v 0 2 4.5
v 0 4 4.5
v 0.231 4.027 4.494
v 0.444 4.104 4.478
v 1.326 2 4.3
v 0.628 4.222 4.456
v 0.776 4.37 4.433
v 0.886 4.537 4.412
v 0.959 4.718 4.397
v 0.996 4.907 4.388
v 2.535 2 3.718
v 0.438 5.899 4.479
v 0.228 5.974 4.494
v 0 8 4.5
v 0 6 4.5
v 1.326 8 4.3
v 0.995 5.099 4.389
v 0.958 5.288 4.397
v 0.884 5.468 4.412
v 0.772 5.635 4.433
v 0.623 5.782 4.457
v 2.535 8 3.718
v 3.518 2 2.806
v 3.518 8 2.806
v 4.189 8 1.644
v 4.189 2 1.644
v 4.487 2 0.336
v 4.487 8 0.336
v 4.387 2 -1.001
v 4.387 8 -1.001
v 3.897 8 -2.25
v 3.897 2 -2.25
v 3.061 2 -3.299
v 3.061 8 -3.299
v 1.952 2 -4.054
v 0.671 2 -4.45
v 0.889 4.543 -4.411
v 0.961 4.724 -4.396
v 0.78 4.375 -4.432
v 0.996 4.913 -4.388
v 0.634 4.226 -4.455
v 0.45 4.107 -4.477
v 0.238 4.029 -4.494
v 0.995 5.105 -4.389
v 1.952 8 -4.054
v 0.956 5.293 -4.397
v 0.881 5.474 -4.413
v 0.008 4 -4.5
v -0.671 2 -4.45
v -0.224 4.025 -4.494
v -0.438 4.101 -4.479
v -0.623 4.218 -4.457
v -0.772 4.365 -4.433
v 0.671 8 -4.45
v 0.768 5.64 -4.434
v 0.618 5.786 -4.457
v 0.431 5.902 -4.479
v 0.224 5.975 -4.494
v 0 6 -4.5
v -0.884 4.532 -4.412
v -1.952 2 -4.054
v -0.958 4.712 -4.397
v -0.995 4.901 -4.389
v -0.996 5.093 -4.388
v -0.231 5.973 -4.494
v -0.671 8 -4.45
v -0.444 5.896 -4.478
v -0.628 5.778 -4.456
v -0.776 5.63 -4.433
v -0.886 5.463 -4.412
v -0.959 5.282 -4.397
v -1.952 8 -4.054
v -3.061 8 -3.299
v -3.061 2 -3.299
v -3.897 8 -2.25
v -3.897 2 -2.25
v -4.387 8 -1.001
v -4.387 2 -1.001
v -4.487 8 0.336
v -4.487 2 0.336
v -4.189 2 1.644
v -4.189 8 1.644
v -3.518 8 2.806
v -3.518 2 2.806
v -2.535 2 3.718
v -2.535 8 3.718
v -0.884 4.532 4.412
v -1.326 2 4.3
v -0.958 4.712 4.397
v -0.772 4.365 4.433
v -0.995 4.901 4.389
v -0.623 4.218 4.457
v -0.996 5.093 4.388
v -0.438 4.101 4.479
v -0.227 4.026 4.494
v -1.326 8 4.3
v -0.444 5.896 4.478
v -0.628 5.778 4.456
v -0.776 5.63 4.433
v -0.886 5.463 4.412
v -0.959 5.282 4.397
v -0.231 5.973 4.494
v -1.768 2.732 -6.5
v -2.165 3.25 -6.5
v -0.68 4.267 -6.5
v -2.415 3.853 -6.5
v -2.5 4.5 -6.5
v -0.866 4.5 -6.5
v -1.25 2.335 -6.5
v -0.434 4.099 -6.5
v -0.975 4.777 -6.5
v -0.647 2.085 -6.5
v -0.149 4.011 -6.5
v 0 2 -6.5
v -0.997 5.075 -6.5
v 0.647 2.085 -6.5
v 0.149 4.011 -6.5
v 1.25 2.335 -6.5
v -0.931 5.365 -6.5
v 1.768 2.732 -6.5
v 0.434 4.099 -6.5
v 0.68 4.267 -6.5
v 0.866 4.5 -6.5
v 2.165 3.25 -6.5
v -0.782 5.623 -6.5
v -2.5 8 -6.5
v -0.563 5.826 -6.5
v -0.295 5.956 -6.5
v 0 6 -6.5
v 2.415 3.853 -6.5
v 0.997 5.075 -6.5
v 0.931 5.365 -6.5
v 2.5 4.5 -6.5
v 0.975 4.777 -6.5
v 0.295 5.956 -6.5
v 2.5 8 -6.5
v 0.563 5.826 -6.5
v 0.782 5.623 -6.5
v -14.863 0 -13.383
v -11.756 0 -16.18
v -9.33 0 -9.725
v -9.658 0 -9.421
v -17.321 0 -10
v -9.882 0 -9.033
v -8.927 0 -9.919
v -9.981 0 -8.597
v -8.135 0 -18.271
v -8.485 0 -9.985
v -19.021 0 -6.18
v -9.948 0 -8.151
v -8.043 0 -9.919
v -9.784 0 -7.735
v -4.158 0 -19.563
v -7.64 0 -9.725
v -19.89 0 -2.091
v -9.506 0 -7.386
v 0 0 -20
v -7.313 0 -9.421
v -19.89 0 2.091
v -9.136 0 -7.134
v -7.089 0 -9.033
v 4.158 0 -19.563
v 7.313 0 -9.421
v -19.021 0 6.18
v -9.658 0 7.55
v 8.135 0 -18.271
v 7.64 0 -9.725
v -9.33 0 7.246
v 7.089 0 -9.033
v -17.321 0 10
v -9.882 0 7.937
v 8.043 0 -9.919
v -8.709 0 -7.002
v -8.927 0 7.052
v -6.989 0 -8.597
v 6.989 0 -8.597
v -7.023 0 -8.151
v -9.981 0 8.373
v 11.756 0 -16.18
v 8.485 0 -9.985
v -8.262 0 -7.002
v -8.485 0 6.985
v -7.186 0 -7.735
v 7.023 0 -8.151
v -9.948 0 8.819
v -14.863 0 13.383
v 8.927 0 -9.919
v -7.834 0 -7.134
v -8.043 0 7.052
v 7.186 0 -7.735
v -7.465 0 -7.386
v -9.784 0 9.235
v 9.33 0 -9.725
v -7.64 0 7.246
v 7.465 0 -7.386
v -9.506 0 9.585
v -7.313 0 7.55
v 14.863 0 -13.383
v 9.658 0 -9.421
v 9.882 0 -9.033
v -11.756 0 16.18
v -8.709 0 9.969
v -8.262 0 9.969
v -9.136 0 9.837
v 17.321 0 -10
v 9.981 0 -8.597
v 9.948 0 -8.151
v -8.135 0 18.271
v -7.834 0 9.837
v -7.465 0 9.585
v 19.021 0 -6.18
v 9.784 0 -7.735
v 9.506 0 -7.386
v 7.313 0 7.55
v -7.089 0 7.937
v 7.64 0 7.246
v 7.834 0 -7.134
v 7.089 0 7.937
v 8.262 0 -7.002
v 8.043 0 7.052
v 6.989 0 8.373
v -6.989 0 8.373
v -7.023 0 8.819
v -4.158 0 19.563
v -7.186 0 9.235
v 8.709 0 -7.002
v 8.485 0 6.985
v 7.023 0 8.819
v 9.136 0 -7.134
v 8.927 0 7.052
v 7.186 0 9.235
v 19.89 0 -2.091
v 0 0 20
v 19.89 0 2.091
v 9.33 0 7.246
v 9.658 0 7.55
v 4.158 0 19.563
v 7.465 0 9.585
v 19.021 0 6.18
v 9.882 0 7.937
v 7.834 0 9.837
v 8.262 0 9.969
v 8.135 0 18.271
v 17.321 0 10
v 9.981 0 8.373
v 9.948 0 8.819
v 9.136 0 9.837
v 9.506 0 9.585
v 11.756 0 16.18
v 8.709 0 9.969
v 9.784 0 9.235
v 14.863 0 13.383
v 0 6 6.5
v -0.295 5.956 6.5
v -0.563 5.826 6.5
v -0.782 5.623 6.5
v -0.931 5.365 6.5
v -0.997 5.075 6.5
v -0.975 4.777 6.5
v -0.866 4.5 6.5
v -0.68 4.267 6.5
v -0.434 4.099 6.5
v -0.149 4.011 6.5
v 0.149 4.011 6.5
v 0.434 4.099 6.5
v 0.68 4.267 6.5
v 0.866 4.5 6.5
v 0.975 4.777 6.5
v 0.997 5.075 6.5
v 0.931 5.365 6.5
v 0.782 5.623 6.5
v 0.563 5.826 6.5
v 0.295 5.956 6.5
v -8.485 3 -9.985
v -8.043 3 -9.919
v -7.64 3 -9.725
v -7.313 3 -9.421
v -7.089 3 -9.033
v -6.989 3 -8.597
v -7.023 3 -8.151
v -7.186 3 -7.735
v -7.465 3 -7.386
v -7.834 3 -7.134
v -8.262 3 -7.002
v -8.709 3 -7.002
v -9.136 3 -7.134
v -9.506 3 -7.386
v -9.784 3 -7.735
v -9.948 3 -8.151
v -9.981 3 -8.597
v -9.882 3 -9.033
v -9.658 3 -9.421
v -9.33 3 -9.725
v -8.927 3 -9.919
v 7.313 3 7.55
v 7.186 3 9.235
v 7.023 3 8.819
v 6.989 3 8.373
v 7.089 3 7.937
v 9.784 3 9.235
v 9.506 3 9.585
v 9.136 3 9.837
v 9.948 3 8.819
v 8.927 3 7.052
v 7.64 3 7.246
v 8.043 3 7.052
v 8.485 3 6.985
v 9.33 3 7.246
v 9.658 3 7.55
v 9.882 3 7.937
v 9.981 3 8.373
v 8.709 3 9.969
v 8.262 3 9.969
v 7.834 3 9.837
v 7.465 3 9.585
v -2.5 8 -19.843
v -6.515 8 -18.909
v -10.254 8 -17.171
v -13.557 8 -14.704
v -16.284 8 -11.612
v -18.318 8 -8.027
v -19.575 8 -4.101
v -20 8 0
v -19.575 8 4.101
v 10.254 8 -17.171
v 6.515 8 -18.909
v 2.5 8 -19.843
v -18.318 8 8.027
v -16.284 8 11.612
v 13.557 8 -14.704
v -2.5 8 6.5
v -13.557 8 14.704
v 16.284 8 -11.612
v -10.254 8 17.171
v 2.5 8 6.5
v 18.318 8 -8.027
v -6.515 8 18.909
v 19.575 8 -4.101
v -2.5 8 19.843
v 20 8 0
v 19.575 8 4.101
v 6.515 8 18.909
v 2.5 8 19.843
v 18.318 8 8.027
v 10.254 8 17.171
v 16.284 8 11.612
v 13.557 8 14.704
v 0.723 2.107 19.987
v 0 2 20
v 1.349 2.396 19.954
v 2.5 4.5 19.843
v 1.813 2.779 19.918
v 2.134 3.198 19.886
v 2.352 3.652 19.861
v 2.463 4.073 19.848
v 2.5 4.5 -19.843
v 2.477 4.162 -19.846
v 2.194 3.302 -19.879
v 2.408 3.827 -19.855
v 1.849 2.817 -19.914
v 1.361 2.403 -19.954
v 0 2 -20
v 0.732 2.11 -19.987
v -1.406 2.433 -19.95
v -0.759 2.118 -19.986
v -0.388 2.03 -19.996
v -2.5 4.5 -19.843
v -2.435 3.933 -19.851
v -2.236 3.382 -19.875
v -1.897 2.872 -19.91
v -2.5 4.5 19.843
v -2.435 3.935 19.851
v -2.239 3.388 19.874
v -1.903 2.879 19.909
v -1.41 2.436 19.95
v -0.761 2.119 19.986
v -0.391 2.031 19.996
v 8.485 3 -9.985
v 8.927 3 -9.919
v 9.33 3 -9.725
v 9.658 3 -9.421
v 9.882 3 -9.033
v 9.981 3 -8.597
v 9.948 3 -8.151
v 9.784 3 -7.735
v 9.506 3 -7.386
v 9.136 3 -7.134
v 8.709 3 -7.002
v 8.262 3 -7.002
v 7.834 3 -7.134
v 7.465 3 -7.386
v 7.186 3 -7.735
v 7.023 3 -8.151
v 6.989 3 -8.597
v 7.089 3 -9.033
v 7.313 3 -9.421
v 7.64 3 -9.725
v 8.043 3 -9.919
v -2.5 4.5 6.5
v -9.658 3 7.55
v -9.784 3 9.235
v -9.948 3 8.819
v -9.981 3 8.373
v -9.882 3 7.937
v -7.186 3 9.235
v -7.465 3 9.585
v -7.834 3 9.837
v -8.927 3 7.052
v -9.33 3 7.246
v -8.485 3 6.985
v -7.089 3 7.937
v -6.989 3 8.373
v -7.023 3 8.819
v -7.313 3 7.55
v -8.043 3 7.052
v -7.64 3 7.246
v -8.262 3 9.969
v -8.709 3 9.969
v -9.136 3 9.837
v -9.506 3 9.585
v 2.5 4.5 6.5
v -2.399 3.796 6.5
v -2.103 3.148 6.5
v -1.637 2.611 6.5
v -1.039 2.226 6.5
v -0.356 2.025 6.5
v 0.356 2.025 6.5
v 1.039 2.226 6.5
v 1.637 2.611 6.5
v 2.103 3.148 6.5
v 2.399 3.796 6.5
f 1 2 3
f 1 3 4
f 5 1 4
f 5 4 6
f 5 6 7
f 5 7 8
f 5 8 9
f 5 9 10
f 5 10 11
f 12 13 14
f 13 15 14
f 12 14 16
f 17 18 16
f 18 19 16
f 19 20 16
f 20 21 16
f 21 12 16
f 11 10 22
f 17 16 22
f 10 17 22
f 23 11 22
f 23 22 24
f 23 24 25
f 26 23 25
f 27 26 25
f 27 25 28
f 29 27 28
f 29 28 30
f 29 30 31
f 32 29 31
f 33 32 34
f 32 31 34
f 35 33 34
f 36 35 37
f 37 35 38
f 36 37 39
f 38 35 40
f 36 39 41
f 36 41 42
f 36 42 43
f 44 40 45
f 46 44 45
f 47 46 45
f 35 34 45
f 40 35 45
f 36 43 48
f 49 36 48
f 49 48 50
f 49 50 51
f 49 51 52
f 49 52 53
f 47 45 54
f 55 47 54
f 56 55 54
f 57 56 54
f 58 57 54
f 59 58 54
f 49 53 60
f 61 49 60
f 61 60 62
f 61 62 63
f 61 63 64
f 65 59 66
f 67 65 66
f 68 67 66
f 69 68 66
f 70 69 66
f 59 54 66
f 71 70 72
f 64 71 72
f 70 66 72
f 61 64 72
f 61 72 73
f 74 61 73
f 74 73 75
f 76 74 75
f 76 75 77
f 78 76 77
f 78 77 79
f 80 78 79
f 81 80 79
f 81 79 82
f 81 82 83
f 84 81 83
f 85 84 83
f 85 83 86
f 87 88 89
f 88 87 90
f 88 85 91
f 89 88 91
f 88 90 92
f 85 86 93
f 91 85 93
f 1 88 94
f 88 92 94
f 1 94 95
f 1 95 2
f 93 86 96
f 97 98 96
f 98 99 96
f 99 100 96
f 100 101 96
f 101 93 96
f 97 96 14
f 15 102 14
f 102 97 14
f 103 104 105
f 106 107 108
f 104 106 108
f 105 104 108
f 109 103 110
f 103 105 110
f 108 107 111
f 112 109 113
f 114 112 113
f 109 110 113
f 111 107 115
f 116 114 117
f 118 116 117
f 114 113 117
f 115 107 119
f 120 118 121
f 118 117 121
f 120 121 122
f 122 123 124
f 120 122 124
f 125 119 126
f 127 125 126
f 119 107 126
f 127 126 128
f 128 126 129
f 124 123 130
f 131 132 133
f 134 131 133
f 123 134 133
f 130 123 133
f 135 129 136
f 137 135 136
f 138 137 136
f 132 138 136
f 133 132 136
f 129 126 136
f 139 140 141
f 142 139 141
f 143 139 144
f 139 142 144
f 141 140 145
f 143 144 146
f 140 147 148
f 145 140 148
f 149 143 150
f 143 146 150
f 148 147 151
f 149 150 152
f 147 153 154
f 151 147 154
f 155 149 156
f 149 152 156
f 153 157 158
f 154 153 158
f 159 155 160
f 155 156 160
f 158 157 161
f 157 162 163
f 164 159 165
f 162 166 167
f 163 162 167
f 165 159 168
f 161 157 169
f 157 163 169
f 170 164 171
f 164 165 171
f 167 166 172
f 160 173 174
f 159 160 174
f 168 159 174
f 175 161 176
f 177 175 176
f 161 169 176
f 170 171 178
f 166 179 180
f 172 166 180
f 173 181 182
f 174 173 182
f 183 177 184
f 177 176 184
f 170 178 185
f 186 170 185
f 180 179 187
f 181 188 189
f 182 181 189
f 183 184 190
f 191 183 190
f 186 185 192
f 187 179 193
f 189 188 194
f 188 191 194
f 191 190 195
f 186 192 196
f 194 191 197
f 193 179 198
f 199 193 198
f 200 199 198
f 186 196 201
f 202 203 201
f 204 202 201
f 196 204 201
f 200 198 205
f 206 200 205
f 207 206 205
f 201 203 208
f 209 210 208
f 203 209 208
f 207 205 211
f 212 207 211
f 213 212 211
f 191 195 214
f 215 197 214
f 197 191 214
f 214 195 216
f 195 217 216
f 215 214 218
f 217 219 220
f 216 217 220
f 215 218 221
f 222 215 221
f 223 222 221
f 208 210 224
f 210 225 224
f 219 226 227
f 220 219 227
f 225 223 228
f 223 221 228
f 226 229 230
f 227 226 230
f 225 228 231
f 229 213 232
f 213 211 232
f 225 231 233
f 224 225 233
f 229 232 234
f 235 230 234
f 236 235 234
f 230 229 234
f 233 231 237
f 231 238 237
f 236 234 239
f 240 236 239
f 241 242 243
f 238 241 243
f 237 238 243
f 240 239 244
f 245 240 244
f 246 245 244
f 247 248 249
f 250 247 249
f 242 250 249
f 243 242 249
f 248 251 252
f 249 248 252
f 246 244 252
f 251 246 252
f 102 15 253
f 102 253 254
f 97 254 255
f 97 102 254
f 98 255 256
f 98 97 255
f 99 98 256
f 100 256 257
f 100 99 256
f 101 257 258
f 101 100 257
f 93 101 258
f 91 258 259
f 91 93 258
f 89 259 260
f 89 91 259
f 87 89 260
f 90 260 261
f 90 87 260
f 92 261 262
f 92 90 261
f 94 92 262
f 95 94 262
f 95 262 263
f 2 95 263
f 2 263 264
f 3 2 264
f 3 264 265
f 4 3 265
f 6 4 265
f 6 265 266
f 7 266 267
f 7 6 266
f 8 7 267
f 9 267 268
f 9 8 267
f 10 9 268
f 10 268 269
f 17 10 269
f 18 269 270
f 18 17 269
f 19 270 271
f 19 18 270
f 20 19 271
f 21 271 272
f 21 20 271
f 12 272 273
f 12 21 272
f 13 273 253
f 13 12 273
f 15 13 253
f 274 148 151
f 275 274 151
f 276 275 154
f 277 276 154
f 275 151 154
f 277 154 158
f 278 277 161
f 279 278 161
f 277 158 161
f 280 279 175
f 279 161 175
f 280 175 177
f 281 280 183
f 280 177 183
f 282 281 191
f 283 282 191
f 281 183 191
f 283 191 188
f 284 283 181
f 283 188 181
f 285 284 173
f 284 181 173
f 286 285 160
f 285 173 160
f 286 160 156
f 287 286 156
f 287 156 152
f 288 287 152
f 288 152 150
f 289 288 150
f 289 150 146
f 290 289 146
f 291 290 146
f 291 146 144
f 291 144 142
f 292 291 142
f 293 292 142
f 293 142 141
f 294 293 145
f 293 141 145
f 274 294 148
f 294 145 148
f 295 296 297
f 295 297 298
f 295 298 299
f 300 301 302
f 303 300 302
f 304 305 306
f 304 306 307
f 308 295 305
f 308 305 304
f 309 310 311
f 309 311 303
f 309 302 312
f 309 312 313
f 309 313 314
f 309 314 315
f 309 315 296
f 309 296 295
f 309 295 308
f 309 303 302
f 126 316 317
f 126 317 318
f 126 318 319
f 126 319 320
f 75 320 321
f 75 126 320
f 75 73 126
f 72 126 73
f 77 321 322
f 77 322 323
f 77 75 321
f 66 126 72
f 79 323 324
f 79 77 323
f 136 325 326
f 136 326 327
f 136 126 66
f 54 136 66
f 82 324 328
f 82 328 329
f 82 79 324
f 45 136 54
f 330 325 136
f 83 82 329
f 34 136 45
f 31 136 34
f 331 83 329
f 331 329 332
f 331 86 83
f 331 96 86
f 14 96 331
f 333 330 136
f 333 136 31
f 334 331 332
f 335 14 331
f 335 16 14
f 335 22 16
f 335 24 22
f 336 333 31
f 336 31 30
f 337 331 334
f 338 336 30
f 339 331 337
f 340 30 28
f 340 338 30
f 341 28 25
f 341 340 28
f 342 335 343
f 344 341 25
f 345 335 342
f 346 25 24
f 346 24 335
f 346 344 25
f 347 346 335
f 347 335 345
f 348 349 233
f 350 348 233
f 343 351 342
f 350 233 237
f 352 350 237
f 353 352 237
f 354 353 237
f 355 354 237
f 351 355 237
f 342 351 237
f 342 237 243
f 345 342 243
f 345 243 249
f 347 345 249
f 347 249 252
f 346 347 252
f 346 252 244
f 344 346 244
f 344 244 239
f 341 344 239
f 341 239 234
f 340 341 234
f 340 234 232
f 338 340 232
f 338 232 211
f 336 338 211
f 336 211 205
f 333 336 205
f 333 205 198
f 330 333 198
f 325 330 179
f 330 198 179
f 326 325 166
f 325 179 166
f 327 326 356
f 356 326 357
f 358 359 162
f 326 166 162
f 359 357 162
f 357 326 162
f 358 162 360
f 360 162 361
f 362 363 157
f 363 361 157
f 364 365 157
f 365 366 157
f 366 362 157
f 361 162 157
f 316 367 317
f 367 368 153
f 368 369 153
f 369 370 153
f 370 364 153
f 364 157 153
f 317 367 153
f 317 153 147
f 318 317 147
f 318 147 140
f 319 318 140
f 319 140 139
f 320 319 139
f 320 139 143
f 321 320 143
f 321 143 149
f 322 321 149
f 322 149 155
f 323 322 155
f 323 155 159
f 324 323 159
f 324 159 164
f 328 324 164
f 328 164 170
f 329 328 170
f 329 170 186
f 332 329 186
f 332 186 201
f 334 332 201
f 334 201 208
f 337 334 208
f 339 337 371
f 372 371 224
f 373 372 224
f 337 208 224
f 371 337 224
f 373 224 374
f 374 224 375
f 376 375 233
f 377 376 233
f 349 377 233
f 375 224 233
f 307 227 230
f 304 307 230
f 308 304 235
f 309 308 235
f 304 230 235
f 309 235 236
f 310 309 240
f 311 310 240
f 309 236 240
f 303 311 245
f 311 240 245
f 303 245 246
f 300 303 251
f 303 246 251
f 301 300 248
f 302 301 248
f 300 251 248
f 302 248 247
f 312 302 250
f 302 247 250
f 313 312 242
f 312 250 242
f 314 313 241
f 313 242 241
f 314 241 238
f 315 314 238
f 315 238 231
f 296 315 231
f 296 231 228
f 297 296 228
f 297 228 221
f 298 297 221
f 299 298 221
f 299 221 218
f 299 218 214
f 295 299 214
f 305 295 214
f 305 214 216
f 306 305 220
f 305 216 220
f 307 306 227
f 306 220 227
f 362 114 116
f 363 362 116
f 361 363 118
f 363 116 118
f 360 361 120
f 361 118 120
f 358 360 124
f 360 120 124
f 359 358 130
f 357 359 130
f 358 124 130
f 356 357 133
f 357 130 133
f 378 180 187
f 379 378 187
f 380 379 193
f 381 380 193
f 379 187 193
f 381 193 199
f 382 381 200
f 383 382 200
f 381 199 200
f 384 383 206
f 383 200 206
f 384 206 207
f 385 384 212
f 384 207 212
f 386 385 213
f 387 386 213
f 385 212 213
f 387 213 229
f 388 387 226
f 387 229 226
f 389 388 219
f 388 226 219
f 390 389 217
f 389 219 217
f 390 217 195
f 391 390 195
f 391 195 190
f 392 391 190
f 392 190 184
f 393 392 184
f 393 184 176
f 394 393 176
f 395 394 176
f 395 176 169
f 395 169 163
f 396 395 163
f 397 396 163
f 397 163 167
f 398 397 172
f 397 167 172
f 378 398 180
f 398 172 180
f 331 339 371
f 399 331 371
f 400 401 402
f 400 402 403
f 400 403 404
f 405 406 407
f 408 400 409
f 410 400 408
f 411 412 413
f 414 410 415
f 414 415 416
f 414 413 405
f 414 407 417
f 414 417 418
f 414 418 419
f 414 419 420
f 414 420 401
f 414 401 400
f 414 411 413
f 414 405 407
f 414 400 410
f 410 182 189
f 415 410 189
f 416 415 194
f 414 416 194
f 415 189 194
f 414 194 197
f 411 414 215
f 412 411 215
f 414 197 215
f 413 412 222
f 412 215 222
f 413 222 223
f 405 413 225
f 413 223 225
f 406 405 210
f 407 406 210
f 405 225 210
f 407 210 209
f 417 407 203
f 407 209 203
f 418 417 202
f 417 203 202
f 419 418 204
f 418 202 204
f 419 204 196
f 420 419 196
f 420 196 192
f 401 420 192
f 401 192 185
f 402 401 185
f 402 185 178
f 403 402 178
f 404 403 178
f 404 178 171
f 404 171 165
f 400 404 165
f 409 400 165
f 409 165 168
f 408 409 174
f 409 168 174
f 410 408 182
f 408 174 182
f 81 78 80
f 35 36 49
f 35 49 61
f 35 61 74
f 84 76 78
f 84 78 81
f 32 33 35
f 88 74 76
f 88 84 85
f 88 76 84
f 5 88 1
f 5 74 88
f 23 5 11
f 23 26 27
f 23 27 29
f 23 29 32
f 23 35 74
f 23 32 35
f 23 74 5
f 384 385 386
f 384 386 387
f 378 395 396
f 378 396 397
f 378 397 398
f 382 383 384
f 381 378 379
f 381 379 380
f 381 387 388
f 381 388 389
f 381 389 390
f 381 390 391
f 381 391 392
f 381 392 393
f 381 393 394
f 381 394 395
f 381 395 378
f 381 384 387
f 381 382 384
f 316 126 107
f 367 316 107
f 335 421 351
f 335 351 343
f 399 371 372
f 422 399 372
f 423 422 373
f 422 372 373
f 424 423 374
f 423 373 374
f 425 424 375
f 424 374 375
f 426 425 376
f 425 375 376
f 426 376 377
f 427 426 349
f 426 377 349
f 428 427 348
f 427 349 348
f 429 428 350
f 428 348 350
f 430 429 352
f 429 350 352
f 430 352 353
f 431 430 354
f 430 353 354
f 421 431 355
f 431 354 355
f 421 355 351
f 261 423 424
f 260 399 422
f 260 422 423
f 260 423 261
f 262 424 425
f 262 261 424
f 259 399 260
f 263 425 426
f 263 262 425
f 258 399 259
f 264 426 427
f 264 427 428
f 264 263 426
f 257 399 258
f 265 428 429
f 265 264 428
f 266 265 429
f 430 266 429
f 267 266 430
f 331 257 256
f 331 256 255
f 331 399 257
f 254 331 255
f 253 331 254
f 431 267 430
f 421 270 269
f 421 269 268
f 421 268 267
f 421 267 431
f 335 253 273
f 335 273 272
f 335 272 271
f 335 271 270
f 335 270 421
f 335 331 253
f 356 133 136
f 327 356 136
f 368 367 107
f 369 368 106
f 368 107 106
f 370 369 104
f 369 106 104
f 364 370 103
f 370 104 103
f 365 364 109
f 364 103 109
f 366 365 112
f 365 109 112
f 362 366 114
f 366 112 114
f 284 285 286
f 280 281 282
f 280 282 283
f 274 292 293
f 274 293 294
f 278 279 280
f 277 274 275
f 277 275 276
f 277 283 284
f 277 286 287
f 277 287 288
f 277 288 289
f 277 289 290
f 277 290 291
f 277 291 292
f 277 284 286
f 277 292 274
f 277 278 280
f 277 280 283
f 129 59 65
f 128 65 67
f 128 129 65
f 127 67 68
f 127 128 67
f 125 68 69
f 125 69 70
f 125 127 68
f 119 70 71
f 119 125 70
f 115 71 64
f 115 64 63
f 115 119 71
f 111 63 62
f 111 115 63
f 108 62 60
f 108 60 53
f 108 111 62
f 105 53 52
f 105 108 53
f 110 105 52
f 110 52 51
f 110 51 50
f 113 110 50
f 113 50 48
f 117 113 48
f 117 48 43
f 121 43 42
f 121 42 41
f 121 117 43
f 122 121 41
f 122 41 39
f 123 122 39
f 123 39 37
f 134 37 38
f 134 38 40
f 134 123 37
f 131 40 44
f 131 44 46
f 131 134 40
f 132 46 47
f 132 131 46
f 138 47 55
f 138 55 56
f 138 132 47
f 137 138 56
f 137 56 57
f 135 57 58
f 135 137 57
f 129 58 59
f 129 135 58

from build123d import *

# Parameters (mm, degrees)
SKETCH2_R               = 20
BOSS_EXTRUDE1_DEPTH     = 8
CUT_EXTRUDE7_DEPTH      = 33.622844756
CUT_EXTRUDE7_DEPTH_BACK = 33.622844756
SKETCH7_R               = 1
CUT_EXTRUDE8_DEPTH      = 13.5
CUT_EXTRUDE15_DEPTH     = 15
SKETCH3_R               = 4.5
CUT_EXTRUDE16_DEPTH     = 6
SKETCH12_R              = 1.5
CUT_EXTRUDE17_DEPTH     = 3


with BuildPart() as part:
    # Sketch2 → Boss-Extrude1 (new body)
    with BuildSketch(Plane(origin=(0, 0, 0), x_dir=(1, 0, 0), z_dir=(0, 1, 0))):
        with Locations(Location((0, 0, 0), (0, 0, 270))):
            Circle(SKETCH2_R)
    extrude(amount=BOSS_EXTRUDE1_DEPTH)

    # Sketch7 → Cut-Extrude7 (cut, two sides: drawn at the far end of the back side and taken through both)
    with BuildSketch(Plane.XY.offset(4.5).offset(-CUT_EXTRUDE7_DEPTH_BACK)):
        with Locations(Location((0, 5, 0), (0, 0, 90))):
            Circle(SKETCH7_R)
    extrude(amount=CUT_EXTRUDE7_DEPTH + CUT_EXTRUDE7_DEPTH_BACK, mode=Mode.SUBTRACT)

    # Sketch9 → Cut-Extrude8 (cut)
    with BuildSketch(Plane.XY.offset(20)):
        with BuildLine():
            Line((2.5, 4.5), (2.5, 8))
            Line((2.5, 8), (-2.5, 8))
            Line((-2.5, 8), (-2.5, 4.5))
            ThreePointArc((-2.5, 4.5), (0, 2), (2.5, 4.5))
        make_face()
    extrude(amount=-CUT_EXTRUDE8_DEPTH, mode=Mode.SUBTRACT)

    # Sketch10 → Cut-Extrude15 (cut)
    with BuildSketch(Plane.XY.offset(-6.5)):
        with BuildLine():
            Line((0, 8), (0, 2))
            ThreePointArc((0, 2), (1.767766953, 2.732233047), (2.5, 4.5))
            Line((2.5, 4.5), (2.5, 8))
            Line((2.5, 8), (0, 8))
        make_face()
        with BuildLine():
            ThreePointArc((-2.5, 4.5), (-1.767766953, 2.732233047), (0, 2))
            Line((0, 2), (0, 8))
            Line((0, 8), (-2.5, 8))
            Line((-2.5, 8), (-2.5, 4.5))
        make_face()
    extrude(amount=-CUT_EXTRUDE15_DEPTH, mode=Mode.SUBTRACT)

    # Sketch3 → Cut-Extrude16 (cut)
    with BuildSketch(Plane(origin=(0, 8, 0), x_dir=(1, 0, 0), z_dir=(0, 1, 0))):
        with Locations(Location((0, 0, 0), (0, 0, 270))):
            Circle(SKETCH3_R)
    extrude(amount=-CUT_EXTRUDE16_DEPTH, mode=Mode.SUBTRACT)

    # Sketch12 → Cut-Extrude17 (cut)
    with BuildSketch(Plane.XZ):
        with Locations(Location((-8.485281374, 8.485281374, 0), (0, 0, 270))):
            Circle(SKETCH12_R)
        with Locations(Location((8.485281374, 8.485281374, 0), (0, 0, 270))):
            Circle(SKETCH12_R)
        with Locations(Location((8.485281374, -8.485281374, 0), (0, 0, 270))):
            Circle(SKETCH12_R)
        with Locations(Location((-8.485281374, -8.485281374, 0), (0, 0, 270))):
            Circle(SKETCH12_R)
    extrude(amount=-CUT_EXTRUDE17_DEPTH, mode=Mode.SUBTRACT)


solid = part.part
